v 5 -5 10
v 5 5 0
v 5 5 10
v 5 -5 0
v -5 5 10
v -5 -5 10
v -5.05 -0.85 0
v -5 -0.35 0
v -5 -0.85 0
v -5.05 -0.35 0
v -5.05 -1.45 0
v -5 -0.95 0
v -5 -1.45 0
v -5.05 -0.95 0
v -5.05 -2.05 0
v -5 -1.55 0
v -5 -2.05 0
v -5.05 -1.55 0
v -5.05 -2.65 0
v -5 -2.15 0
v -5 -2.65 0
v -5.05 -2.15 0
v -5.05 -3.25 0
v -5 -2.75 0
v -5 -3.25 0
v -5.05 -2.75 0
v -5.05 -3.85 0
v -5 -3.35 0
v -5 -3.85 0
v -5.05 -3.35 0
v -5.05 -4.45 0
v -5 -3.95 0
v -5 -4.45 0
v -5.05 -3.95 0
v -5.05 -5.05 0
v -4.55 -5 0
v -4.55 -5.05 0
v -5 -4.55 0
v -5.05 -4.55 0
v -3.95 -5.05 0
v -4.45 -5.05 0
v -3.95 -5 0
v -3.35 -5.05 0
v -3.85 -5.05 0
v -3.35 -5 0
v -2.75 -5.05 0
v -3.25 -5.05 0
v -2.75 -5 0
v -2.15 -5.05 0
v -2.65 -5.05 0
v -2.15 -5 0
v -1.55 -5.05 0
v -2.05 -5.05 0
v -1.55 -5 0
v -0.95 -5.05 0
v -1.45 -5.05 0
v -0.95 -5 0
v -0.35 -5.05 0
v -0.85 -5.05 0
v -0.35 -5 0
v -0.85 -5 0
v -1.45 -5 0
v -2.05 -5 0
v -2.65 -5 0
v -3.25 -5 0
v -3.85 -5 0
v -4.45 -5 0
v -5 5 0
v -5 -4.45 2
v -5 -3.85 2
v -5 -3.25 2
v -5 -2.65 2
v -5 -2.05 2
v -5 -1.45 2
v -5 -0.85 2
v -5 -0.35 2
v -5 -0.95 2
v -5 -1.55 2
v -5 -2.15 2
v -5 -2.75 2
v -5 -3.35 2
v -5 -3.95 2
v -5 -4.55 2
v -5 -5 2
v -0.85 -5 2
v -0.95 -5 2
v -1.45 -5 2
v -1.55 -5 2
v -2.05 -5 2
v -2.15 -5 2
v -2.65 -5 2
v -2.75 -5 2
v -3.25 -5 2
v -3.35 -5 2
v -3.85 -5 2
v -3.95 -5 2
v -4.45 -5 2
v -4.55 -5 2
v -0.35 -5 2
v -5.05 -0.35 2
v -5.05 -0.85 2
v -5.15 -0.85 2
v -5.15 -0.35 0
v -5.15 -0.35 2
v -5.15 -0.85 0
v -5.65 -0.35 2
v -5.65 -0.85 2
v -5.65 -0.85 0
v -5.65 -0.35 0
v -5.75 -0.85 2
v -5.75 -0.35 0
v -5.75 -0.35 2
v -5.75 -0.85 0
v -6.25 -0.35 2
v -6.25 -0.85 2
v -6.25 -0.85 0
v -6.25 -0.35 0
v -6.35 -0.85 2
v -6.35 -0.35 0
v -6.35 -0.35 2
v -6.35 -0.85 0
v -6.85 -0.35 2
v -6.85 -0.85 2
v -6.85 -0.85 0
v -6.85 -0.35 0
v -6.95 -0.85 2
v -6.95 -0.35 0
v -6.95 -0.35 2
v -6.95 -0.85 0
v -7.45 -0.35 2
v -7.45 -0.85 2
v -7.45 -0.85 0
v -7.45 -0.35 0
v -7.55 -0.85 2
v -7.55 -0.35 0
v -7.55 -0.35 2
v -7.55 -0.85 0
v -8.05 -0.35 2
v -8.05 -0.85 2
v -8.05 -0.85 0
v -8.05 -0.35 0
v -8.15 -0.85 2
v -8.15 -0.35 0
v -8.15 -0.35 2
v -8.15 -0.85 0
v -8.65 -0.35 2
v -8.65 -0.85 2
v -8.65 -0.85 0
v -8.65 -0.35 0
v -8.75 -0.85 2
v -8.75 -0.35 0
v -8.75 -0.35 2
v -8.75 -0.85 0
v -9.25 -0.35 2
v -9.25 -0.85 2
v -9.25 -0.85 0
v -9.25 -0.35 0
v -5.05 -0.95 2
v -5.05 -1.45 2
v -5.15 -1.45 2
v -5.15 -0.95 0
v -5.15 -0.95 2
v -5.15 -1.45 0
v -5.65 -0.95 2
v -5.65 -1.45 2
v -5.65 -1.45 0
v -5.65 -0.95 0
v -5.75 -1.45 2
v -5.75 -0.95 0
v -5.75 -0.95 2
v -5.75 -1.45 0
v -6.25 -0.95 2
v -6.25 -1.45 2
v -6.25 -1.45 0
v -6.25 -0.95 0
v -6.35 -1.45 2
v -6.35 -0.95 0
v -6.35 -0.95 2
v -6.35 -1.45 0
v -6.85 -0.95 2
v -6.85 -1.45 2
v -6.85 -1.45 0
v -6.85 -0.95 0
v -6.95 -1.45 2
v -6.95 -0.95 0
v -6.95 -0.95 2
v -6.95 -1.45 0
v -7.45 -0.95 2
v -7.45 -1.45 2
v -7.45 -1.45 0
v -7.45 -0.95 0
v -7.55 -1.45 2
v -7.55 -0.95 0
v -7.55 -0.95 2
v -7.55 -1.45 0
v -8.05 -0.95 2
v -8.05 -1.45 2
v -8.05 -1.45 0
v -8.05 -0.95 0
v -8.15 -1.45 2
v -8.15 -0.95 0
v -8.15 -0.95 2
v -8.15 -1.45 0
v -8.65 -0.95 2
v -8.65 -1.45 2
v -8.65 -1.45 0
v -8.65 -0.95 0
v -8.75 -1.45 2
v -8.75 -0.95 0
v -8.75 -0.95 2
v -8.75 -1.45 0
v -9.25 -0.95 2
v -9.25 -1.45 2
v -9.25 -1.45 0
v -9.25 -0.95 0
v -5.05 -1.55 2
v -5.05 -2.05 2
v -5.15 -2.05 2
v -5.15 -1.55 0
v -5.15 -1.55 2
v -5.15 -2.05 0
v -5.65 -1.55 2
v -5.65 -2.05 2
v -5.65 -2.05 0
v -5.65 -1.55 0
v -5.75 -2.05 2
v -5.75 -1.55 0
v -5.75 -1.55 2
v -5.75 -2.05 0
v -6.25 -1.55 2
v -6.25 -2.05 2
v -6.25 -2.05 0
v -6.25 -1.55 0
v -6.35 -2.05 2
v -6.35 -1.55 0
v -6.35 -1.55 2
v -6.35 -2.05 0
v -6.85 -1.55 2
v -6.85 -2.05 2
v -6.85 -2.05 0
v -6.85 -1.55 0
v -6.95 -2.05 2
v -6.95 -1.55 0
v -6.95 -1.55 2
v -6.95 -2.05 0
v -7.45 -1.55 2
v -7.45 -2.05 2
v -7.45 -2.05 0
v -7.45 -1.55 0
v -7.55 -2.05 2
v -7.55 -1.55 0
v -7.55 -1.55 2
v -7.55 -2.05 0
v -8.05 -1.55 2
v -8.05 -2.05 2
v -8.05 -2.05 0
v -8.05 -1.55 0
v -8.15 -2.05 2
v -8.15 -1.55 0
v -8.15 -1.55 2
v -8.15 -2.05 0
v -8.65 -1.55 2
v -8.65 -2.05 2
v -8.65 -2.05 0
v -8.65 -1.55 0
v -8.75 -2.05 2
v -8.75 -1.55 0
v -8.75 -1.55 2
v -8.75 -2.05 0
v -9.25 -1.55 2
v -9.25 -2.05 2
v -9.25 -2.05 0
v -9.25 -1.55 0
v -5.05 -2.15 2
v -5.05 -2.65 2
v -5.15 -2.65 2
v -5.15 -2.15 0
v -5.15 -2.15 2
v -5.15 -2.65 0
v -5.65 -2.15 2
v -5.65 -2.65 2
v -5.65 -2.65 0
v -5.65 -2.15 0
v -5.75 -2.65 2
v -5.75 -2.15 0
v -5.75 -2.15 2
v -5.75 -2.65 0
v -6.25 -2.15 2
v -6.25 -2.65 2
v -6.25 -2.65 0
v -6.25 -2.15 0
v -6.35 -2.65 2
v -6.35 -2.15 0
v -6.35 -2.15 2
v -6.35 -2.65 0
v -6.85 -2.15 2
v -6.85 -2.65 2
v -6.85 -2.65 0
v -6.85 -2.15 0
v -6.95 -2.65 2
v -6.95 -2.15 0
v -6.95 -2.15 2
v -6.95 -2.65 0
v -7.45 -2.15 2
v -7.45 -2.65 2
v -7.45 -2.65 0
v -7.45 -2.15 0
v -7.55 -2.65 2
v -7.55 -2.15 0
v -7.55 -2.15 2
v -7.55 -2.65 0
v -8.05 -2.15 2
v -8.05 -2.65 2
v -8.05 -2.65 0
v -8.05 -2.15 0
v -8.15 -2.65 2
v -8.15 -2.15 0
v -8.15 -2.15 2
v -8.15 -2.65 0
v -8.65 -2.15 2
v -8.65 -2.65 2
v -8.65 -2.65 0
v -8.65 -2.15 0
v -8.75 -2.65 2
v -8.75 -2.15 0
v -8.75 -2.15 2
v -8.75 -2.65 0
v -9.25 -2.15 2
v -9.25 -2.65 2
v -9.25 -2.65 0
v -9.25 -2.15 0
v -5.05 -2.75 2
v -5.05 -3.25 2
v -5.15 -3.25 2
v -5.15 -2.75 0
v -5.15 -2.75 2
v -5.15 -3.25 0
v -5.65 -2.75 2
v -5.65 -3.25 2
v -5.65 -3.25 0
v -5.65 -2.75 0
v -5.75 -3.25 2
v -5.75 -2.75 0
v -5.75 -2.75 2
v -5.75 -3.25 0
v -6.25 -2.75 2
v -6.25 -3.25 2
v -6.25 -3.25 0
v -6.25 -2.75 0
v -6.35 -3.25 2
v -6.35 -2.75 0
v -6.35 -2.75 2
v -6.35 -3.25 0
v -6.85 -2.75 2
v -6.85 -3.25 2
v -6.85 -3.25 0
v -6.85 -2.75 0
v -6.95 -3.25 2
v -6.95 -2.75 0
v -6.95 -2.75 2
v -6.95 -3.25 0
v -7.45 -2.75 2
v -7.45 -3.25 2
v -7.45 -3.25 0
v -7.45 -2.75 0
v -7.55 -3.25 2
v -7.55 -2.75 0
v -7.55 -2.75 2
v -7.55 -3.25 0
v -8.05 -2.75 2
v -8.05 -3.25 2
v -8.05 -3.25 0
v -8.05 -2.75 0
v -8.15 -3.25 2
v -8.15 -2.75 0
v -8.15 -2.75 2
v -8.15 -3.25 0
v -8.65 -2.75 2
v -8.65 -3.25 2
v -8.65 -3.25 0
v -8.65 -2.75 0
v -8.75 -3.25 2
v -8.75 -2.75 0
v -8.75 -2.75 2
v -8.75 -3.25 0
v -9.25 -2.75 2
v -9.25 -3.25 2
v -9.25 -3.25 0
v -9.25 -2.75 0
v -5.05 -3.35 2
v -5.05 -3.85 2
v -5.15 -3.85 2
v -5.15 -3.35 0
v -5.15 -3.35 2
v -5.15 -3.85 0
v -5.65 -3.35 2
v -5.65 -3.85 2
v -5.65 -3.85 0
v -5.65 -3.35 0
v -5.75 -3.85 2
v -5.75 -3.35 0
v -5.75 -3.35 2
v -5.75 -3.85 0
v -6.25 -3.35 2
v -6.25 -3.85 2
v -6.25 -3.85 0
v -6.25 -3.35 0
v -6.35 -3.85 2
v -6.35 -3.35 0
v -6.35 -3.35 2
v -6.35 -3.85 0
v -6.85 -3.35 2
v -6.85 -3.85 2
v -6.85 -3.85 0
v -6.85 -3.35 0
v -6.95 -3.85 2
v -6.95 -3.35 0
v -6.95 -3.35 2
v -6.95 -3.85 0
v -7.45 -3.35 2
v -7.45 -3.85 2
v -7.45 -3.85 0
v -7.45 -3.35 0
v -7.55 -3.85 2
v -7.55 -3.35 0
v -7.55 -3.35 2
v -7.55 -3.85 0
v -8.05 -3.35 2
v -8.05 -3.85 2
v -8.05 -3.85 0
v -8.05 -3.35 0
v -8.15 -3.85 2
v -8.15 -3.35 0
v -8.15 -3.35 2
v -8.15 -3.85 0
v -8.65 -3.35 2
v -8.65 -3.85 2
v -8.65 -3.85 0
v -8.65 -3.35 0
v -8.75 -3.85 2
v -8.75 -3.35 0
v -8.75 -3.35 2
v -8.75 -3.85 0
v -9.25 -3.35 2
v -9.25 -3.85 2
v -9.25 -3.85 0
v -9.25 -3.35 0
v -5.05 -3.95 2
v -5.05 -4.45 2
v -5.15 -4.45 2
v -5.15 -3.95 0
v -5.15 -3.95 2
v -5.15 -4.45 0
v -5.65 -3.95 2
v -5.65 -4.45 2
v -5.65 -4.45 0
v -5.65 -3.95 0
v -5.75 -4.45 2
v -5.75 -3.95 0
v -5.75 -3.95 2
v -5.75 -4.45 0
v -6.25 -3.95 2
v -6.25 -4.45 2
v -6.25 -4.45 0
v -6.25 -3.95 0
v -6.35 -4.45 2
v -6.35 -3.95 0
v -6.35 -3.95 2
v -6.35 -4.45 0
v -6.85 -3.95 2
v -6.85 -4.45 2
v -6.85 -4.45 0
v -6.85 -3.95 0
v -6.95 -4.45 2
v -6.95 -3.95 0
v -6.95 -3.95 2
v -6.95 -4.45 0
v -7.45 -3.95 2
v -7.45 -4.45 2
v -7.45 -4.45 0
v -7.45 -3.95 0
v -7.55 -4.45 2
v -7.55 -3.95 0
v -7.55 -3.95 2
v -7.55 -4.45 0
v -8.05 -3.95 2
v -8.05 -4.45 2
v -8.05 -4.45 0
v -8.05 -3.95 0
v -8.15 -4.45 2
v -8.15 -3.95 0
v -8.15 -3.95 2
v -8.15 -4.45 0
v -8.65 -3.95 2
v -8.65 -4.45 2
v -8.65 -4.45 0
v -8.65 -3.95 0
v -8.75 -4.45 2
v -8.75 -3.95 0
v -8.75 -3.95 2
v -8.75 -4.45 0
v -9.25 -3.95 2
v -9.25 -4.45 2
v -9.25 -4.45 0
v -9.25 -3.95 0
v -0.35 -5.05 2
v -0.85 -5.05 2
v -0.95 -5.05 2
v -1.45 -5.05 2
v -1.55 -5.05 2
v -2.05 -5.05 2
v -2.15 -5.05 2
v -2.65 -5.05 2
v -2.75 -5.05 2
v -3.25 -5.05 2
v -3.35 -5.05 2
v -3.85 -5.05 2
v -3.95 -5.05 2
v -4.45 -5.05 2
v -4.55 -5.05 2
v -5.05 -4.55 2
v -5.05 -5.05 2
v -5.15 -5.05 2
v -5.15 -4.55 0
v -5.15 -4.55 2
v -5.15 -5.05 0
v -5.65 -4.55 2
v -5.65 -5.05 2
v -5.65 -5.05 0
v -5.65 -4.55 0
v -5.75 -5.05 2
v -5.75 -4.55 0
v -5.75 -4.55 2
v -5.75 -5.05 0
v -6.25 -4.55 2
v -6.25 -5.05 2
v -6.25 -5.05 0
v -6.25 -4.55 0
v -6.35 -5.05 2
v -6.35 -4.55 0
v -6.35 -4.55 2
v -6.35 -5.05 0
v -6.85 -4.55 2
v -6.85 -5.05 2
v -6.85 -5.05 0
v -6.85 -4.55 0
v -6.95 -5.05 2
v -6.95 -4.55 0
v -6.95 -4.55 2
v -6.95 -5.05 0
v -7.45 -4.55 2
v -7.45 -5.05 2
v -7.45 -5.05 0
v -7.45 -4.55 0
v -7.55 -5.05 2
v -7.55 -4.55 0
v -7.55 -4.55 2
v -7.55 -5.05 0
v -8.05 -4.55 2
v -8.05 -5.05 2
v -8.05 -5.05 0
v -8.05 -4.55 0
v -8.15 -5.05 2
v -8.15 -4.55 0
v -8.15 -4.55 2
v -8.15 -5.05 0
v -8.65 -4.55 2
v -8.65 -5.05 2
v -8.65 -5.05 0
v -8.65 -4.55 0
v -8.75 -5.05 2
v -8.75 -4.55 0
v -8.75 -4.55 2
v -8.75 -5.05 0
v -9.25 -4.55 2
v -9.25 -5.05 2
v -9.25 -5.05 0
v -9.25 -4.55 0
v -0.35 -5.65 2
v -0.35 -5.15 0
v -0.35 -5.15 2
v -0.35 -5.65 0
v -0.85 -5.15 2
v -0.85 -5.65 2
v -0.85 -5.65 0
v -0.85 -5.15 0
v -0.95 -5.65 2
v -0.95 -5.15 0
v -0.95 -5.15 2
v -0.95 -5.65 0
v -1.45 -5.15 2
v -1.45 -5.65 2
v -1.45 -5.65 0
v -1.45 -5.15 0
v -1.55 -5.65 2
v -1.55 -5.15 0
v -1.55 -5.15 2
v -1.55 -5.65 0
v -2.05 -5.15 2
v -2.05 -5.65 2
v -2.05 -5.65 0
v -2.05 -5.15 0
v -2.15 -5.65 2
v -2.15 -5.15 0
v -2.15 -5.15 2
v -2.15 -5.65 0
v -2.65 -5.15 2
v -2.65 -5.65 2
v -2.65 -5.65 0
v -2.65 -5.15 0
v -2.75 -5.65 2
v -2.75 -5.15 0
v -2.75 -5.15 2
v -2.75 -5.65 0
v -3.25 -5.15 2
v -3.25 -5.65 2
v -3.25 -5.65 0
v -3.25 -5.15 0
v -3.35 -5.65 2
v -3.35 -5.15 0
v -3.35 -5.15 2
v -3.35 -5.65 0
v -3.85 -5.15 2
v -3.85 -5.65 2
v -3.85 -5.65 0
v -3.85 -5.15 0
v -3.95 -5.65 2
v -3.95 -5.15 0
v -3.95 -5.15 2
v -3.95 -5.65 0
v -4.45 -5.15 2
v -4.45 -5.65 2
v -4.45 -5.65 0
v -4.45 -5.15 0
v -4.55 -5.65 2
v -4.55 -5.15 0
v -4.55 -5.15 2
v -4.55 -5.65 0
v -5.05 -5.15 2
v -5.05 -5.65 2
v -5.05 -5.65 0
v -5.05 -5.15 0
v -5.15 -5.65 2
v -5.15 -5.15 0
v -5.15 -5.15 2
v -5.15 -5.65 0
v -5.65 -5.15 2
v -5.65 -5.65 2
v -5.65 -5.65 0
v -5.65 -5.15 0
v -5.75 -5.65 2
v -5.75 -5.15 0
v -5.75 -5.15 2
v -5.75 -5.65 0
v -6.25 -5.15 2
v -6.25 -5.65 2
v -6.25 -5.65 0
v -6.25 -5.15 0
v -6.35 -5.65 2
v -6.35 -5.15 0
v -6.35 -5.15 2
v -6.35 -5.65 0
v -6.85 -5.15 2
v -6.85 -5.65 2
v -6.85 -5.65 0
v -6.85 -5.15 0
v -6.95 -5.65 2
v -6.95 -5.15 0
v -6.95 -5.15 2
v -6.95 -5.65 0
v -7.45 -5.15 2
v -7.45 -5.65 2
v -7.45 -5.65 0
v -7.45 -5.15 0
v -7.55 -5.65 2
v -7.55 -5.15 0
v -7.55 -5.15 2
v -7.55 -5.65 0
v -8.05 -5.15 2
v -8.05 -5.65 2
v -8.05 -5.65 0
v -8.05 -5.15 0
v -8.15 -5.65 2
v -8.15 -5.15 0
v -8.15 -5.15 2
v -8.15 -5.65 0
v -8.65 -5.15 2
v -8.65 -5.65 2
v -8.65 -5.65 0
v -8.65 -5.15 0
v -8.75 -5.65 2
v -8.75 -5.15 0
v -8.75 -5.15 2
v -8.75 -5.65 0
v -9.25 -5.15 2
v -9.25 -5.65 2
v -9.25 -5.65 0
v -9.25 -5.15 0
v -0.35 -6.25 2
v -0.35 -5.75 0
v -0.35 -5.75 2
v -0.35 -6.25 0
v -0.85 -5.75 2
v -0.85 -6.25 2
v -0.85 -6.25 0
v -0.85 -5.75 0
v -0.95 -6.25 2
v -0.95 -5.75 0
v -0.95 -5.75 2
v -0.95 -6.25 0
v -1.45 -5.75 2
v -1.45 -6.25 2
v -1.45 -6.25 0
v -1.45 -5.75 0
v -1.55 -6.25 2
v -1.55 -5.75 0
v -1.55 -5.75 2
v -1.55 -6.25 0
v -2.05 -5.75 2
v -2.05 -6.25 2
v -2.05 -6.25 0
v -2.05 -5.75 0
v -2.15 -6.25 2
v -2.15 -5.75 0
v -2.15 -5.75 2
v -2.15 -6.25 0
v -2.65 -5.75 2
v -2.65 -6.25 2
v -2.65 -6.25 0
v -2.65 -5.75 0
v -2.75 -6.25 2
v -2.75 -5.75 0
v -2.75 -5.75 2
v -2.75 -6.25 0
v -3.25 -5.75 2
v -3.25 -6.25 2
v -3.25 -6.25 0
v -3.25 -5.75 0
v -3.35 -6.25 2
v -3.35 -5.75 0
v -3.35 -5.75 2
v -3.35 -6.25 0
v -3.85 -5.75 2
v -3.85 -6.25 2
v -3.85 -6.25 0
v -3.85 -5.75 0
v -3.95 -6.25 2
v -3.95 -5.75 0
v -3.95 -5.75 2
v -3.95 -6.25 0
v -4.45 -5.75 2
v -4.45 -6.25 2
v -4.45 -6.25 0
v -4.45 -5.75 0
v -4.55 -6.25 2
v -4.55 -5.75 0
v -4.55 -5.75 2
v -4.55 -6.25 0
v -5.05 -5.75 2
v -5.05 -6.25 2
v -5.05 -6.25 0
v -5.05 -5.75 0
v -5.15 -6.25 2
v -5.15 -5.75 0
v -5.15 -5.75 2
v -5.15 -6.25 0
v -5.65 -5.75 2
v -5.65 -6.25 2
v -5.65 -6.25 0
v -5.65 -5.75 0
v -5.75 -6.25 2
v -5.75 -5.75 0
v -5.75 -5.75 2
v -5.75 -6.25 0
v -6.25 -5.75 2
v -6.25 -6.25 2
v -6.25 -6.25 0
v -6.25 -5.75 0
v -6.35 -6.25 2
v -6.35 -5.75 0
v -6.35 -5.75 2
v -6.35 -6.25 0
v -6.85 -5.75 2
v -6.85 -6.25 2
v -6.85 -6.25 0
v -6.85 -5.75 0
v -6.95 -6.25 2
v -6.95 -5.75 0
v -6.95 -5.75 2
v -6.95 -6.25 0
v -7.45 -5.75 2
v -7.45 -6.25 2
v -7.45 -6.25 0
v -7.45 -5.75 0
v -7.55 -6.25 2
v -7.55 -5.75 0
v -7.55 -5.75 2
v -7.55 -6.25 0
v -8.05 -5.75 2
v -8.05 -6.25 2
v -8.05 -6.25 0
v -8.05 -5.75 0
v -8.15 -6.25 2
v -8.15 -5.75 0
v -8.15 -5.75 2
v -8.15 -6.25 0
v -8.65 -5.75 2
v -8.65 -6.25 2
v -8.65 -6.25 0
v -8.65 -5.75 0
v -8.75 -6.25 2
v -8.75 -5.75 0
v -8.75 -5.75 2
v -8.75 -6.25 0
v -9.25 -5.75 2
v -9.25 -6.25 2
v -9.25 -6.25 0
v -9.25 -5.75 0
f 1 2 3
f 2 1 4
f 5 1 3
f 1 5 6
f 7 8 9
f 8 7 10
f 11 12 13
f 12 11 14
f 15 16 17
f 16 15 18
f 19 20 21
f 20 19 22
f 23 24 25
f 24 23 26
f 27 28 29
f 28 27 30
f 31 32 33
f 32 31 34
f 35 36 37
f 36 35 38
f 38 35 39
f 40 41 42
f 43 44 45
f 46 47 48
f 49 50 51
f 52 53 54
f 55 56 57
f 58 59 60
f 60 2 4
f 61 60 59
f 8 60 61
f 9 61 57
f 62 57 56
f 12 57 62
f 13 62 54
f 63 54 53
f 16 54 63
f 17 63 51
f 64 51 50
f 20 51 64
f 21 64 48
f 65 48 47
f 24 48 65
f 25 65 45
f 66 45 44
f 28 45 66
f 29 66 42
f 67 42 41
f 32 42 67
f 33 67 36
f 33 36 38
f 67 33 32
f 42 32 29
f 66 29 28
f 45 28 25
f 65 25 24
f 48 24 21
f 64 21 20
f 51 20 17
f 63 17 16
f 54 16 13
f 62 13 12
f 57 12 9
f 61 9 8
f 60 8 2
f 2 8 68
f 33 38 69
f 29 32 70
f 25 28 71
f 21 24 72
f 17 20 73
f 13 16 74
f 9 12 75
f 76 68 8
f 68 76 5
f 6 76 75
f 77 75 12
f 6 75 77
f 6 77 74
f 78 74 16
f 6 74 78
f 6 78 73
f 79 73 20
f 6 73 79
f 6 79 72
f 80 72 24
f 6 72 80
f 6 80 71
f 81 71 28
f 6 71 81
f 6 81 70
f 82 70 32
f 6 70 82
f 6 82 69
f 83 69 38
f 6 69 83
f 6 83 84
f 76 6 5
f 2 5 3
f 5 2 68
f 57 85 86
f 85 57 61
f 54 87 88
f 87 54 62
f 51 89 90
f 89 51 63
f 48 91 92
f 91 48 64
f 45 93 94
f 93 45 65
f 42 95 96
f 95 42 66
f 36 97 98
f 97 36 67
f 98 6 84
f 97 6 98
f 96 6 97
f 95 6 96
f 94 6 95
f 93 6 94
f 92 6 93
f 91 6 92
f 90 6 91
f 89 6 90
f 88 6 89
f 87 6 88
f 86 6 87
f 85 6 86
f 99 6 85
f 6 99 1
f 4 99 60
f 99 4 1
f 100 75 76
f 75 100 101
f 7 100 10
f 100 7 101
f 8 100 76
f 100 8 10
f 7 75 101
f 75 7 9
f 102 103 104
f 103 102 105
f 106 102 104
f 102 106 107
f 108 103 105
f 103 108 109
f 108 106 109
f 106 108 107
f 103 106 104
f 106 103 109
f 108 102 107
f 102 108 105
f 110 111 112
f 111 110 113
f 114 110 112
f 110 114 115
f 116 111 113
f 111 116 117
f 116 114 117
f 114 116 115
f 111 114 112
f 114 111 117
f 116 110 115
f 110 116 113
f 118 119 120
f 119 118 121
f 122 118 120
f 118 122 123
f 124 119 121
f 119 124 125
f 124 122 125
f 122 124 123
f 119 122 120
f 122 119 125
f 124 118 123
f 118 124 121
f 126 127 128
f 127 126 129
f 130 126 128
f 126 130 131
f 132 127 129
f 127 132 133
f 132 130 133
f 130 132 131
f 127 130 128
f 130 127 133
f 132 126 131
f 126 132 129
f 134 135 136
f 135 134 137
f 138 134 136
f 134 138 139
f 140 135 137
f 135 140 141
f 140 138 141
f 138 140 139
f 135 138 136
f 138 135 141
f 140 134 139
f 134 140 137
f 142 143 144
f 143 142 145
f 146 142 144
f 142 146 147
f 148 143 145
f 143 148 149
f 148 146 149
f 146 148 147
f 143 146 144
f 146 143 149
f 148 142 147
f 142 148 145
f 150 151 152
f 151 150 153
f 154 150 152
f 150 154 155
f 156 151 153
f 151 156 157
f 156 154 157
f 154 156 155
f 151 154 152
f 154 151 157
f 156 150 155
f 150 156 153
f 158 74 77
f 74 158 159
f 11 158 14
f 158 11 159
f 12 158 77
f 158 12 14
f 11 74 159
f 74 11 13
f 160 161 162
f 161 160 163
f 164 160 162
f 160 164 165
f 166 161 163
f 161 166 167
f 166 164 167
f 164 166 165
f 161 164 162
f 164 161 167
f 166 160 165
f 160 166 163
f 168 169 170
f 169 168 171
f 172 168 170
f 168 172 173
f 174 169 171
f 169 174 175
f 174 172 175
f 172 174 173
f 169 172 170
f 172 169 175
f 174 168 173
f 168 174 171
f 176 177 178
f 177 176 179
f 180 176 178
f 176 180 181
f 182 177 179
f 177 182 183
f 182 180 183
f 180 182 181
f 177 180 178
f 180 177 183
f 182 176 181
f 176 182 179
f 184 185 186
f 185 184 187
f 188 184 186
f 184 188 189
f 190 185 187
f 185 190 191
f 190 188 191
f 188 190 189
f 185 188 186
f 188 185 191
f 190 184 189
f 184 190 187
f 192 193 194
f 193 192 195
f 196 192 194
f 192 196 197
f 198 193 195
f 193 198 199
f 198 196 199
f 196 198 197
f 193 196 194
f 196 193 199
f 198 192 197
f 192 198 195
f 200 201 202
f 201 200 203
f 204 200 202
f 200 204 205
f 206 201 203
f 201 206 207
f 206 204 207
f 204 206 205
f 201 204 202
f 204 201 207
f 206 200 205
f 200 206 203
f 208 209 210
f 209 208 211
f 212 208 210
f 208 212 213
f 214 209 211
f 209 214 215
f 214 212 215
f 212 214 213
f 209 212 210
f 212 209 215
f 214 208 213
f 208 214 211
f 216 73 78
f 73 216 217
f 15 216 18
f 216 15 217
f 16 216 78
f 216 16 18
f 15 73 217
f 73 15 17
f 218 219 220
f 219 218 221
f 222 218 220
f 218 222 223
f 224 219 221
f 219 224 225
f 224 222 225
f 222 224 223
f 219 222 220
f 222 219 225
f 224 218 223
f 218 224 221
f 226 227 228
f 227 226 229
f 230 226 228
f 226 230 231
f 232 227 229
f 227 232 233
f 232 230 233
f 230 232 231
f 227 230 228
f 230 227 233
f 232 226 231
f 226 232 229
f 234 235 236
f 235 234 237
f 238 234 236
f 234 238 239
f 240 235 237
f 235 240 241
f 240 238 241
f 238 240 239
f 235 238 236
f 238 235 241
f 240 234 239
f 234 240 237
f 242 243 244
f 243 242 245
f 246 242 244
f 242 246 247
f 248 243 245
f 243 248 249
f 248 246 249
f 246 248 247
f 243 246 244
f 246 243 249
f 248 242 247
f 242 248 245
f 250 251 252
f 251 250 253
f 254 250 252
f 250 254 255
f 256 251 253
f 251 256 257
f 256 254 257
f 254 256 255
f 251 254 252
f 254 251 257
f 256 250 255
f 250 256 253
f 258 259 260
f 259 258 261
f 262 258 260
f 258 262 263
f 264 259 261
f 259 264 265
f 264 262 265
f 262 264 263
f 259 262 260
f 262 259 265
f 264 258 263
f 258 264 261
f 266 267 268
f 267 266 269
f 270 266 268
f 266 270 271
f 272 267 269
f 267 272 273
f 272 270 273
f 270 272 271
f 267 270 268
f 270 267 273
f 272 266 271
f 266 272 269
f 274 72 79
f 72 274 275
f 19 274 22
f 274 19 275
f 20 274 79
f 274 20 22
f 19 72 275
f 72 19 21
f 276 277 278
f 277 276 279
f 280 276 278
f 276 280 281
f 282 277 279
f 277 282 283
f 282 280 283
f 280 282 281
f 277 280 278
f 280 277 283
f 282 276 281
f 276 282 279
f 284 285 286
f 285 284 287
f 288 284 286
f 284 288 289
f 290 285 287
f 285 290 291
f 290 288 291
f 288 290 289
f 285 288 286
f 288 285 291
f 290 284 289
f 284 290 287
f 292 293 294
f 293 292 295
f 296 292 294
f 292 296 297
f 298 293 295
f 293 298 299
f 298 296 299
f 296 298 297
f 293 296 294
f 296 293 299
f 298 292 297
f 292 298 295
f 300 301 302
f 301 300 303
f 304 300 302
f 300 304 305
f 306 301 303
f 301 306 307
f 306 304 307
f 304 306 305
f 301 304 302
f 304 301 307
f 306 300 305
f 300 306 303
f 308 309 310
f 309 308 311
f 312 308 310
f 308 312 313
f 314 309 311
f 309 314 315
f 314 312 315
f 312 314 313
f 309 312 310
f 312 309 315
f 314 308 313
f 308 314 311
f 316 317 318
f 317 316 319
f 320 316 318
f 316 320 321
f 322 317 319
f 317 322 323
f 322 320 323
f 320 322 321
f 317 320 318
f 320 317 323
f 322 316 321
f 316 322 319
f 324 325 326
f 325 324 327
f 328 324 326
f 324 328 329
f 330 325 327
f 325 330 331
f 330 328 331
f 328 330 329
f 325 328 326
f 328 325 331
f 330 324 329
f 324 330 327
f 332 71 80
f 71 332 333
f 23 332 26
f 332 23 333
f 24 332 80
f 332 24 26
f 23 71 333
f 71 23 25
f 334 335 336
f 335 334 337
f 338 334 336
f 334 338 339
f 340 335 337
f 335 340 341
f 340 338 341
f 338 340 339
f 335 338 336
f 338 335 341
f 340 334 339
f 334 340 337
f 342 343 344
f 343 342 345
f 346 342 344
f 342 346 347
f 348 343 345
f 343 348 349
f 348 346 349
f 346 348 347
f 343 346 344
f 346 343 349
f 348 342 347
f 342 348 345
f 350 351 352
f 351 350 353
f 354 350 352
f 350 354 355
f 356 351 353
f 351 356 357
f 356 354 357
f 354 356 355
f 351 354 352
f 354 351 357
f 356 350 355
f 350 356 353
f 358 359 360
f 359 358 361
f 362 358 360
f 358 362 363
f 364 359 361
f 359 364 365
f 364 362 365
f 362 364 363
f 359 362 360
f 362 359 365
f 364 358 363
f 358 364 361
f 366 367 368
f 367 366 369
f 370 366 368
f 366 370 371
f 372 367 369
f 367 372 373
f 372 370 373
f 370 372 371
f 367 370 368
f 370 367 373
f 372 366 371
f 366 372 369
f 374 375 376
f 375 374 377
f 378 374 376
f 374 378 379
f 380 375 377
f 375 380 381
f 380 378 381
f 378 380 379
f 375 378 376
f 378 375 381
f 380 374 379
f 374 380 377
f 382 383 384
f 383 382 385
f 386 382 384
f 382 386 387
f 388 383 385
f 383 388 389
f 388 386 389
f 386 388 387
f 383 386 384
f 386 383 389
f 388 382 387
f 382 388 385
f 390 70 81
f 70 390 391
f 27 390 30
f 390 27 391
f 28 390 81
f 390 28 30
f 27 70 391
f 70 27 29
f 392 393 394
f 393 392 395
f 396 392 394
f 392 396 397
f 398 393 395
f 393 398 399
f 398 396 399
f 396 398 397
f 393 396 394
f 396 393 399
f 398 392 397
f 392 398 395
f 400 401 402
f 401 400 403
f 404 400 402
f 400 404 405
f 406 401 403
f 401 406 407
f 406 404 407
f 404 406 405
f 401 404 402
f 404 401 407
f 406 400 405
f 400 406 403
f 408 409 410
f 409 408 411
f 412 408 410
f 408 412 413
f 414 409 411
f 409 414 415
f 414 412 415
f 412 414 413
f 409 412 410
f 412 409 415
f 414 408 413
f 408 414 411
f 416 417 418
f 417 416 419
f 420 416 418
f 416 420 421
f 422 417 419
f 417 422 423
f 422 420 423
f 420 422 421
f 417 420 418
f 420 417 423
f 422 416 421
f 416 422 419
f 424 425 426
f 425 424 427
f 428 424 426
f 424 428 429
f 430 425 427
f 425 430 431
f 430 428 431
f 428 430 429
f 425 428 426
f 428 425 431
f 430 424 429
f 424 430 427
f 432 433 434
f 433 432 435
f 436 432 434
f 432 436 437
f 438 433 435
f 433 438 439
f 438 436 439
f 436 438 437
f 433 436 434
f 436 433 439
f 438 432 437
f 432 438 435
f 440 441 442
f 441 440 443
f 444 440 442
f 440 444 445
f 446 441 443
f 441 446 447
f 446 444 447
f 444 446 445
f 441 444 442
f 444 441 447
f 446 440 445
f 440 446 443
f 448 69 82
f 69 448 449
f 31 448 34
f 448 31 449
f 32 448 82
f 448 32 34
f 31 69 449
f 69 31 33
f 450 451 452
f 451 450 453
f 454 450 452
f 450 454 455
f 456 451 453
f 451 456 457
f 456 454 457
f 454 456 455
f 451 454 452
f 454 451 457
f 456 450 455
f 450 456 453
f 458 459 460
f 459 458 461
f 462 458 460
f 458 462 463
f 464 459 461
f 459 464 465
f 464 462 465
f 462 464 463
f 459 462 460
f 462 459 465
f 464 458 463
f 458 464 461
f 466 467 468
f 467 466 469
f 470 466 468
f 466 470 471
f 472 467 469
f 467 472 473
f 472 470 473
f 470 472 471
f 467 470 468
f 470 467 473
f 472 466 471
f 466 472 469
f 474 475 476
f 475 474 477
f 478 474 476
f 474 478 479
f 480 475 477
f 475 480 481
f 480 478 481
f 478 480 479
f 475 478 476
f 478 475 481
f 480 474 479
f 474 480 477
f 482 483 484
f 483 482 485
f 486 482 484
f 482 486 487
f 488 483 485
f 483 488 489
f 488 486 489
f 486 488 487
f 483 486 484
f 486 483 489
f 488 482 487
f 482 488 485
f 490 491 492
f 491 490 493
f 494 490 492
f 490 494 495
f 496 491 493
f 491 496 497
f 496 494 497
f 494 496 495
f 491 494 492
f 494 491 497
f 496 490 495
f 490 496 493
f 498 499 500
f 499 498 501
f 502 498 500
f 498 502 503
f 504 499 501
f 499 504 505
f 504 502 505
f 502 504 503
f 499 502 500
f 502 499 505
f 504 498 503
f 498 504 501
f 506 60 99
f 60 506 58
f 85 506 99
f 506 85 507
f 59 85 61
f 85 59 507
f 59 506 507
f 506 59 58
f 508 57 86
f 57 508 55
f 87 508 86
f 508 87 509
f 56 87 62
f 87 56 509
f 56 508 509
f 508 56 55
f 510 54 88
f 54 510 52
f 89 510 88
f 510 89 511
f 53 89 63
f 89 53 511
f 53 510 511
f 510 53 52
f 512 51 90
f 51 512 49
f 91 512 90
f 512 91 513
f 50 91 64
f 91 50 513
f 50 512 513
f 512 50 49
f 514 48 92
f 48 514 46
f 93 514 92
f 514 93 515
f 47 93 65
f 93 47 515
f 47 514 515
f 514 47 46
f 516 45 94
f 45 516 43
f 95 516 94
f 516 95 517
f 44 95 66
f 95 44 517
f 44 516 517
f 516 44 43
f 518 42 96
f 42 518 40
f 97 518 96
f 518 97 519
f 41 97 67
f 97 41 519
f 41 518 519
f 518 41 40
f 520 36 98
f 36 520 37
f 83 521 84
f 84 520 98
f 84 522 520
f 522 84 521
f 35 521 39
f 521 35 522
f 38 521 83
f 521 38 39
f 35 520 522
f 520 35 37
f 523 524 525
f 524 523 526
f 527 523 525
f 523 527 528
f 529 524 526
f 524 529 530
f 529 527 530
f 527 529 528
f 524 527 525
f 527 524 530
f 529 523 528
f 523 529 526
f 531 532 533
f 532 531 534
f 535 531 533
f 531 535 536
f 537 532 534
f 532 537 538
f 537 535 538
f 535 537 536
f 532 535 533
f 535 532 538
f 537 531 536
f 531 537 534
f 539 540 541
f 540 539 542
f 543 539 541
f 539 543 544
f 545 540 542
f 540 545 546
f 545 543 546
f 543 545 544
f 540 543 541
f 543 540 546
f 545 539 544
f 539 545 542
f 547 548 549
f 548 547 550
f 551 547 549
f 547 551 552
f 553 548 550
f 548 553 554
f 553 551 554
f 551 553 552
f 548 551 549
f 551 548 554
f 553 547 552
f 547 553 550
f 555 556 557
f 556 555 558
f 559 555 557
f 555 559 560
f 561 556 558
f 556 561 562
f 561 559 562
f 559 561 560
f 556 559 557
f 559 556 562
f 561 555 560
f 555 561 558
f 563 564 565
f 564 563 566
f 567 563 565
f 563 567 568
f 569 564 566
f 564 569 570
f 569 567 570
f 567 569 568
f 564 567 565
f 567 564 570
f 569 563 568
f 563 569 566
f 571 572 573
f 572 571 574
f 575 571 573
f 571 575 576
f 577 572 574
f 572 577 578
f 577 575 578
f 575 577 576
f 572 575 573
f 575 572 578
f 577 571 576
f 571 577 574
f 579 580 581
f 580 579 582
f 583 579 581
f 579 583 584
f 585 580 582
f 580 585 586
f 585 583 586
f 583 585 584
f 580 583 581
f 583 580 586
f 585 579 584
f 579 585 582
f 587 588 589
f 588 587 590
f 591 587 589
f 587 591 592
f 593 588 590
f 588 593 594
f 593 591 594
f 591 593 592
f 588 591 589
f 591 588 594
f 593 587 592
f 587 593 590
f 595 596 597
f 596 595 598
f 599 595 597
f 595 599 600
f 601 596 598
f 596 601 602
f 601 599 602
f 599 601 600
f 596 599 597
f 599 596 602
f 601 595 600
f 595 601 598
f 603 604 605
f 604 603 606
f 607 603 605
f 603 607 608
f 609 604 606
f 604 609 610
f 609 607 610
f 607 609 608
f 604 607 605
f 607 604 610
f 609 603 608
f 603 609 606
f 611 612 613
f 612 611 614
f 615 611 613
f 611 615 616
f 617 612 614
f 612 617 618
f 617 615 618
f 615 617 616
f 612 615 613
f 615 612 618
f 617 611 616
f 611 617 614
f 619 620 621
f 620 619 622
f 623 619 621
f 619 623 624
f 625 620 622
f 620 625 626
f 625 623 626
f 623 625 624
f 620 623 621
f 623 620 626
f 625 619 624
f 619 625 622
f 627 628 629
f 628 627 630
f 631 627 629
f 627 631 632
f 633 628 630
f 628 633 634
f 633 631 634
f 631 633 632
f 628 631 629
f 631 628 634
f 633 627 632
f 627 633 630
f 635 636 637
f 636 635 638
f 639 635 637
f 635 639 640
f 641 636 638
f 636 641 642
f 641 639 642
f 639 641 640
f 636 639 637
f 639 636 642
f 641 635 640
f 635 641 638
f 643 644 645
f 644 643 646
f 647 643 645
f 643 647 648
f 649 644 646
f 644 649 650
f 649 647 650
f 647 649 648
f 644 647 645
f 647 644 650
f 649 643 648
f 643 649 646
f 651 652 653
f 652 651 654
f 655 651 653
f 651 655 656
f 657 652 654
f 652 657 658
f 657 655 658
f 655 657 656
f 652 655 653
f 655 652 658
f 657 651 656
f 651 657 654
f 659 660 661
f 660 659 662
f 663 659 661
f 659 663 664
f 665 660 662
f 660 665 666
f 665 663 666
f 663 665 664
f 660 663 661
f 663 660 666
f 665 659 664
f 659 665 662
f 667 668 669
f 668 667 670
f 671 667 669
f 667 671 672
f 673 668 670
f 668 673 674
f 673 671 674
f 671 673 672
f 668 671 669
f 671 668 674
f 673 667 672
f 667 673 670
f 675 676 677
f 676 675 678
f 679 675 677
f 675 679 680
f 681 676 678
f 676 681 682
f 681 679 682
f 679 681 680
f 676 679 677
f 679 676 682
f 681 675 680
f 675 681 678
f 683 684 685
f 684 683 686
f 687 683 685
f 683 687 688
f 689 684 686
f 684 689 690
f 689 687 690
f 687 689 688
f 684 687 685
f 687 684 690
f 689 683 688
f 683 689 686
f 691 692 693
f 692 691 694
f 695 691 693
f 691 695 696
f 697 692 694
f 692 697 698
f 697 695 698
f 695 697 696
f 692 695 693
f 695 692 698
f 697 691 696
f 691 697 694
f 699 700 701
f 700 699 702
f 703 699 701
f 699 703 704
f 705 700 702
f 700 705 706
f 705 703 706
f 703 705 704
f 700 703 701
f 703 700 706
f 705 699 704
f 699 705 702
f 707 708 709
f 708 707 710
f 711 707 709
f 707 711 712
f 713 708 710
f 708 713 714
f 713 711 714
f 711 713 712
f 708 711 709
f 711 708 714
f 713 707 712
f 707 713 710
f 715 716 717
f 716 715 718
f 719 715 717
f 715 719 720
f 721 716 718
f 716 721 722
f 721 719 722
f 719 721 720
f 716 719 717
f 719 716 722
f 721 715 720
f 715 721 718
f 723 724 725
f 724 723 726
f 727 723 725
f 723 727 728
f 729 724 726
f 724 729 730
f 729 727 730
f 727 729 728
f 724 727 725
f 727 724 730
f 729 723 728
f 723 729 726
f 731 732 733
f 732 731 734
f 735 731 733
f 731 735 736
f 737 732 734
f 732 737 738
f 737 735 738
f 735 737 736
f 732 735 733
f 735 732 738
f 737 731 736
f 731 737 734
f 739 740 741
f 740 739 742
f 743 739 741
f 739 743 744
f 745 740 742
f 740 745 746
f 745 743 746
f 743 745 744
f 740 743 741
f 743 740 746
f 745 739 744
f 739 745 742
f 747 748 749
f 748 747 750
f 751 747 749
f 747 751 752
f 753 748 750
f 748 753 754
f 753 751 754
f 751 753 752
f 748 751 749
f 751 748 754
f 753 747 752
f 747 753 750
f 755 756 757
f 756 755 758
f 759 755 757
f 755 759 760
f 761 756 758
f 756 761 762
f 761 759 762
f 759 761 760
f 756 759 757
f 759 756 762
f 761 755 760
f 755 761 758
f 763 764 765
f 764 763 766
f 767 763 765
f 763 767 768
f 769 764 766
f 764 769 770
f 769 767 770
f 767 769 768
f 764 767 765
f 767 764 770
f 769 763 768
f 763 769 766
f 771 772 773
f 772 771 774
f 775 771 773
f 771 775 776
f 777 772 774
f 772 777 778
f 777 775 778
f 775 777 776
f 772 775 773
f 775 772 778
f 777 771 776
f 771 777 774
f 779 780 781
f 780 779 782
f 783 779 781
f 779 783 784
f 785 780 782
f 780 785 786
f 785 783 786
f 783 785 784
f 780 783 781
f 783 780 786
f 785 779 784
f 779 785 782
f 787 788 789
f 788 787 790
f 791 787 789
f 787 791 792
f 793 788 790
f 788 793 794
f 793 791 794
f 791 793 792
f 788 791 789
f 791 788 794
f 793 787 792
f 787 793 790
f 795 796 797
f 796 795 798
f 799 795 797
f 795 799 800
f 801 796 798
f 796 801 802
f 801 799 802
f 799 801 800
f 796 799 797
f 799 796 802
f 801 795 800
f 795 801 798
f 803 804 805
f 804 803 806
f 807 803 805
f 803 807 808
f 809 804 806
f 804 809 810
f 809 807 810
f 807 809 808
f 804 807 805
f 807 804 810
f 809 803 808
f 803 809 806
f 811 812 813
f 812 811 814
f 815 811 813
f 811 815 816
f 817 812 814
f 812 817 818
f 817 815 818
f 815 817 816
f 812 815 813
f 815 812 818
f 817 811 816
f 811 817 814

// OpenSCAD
translate([0, 0, 5]) color([0,1,0,0.9]) cube([10, 10, 10], center=true);
translate([-0.6, -0.6, 1]) color([1,0,0]) cube([0.5, 0.5, 2], center=true);
translate([-1.2, -0.6, 1]) color([1,0,0]) cube([0.5, 0.5, 2], center=true);
translate([-1.8, -0.6, 1]) color([1,0,0]) cube([0.5, 0.5, 2], center=true);
translate([-2.4, -0.6, 1]) color([1,0,0]) cube([0.5, 0.5, 2], center=true);
translate([-3.0, -0.6, 1]) color([1,0,0]) cube([0.5, 0.5, 2], center=true);
translate([-3.6, -0.6, 1]) color([1,0,0]) cube([0.5, 0.5, 2], center=true);
translate([-4.2, -0.6, 1]) color([1,0,0]) cube([0.5, 0.5, 2], center=true);
translate([-4.8, -0.6, 1]) color([1,0,0]) cube([0.5, 0.5, 2], center=true);
translate([-5.4, -0.6, 1]) color([1,0,0]) cube([0.5, 0.5, 2], center=true);
translate([-6.0, -0.6, 1]) color([1,0,0]) cube([0.5, 0.5, 2], center=true);
translate([-6.6, -0.6, 1]) color([1,0,0]) cube([0.5, 0.5, 2], center=true);
translate([-7.2, -0.6, 1]) color([1,0,0]) cube([0.5, 0.5, 2], center=true);
translate([-7.8, -0.6, 1]) color([1,0,0]) cube([0.5, 0.5, 2], center=true);
translate([-8.4, -0.6, 1]) color([1,0,0]) cube([0.5, 0.5, 2], center=true);
translate([-9.0, -0.6, 1]) color([1,0,0]) cube([0.5, 0.5, 2], center=true);
translate([-0.6, -1.2, 1]) color([1,0,0]) cube([0.5, 0.5, 2], center=true);
translate([-1.2, -1.2, 1]) color([1,0,0]) cube([0.5, 0.5, 2], center=true);
translate([-1.8, -1.2, 1]) color([1,0,0]) cube([0.5, 0.5, 2], center=true);
translate([-2.4, -1.2, 1]) color([1,0,0]) cube([0.5, 0.5, 2], center=true);
translate([-3.0, -1.2, 1]) color([1,0,0]) cube([0.5, 0.5, 2], center=true);
translate([-3.6, -1.2, 1]) color([1,0,0]) cube([0.5, 0.5, 2], center=true);
translate([-4.2, -1.2, 1]) color([1,0,0]) cube([0.5, 0.5, 2], center=true);
translate([-4.8, -1.2, 1]) color([1,0,0]) cube([0.5, 0.5, 2], center=true);
translate([-5.4, -1.2, 1]) color([1,0,0]) cube([0.5, 0.5, 2], center=true);
translate([-6.0, -1.2, 1]) color([1,0,0]) cube([0.5, 0.5, 2], center=true);
translate([-6.6, -1.2, 1]) color([1,0,0]) cube([0.5, 0.5, 2], center=true);
translate([-7.2, -1.2, 1]) color([1,0,0]) cube([0.5, 0.5, 2], center=true);
translate([-7.8, -1.2, 1]) color([1,0,0]) cube([0.5, 0.5, 2], center=true);
translate([-8.4, -1.2, 1]) color([1,0,0]) cube([0.5, 0.5, 2], center=true);
translate([-9.0, -1.2, 1]) color([1,0,0]) cube([0.5, 0.5, 2], center=true);
translate([-0.6, -1.8, 1]) color([1,0,0]) cube([0.5, 0.5, 2], center=true);
translate([-1.2, -1.8, 1]) color([1,0,0]) cube([0.5, 0.5, 2], center=true);
translate([-1.8, -1.8, 1]) color([1,0,0]) cube([0.5, 0.5, 2], center=true);
translate([-2.4, -1.8, 1]) color([1,0,0]) cube([0.5, 0.5, 2], center=true);
translate([-3.0, -1.8, 1]) color([1,0,0]) cube([0.5, 0.5, 2], center=true);
translate([-3.6, -1.8, 1]) color([1,0,0]) cube([0.5, 0.5, 2], center=true);
translate([-4.2, -1.8, 1]) color([1,0,0]) cube([0.5, 0.5, 2], center=true);
translate([-4.8, -1.8, 1]) color([1,0,0]) cube([0.5, 0.5, 2], center=true);
translate([-5.4, -1.8, 1]) color([1,0,0]) cube([0.5, 0.5, 2], center=true);
translate([-6.0, -1.8, 1]) color([1,0,0]) cube([0.5, 0.5, 2], center=true);
translate([-6.6, -1.8, 1]) color([1,0,0]) cube([0.5, 0.5, 2], center=true);
translate([-7.2, -1.8, 1]) color([1,0,0]) cube([0.5, 0.5, 2], center=true);
translate([-7.8, -1.8, 1]) color([1,0,0]) cube([0.5, 0.5, 2], center=true);
translate([-8.4, -1.8, 1]) color([1,0,0]) cube([0.5, 0.5, 2], center=true);
translate([-9.0, -1.8, 1]) color([1,0,0]) cube([0.5, 0.5, 2], center=true);
translate([-0.6, -2.4, 1]) color([1,0,0]) cube([0.5, 0.5, 2], center=true);
translate([-1.2, -2.4, 1]) color([1,0,0]) cube([0.5, 0.5, 2], center=true);
translate([-1.8, -2.4, 1]) color([1,0,0]) cube([0.5, 0.5, 2], center=true);
translate([-2.4, -2.4, 1]) color([1,0,0]) cube([0.5, 0.5, 2], center=true);
translate([-3.0, -2.4, 1]) color([1,0,0]) cube([0.5, 0.5, 2], center=true);
translate([-3.6, -2.4, 1]) color([1,0,0]) cube([0.5, 0.5, 2], center=true);
translate([-4.2, -2.4, 1]) color([1,0,0]) cube([0.5, 0.5, 2], center=true);
translate([-4.8, -2.4, 1]) color([1,0,0]) cube([0.5, 0.5, 2], center=true);
translate([-5.4, -2.4, 1]) color([1,0,0]) cube([0.5, 0.5, 2], center=true);
translate([-6.0, -2.4, 1]) color([1,0,0]) cube([0.5, 0.5, 2], center=true);
translate([-6.6, -2.4, 1]) color([1,0,0]) cube([0.5, 0.5, 2], center=true);
translate([-7.2, -2.4, 1]) color([1,0,0]) cube([0.5, 0.5, 2], center=true);
translate([-7.8, -2.4, 1]) color([1,0,0]) cube([0.5, 0.5, 2], center=true);
translate([-8.4, -2.4, 1]) color([1,0,0]) cube([0.5, 0.5, 2], center=true);
translate([-9.0, -2.4, 1]) color([1,0,0]) cube([0.5, 0.5, 2], center=true);
translate([-0.6, -3.0, 1]) color([1,0,0]) cube([0.5, 0.5, 2], center=true);
translate([-1.2, -3.0, 1]) color([1,0,0]) cube([0.5, 0.5, 2], center=true);
translate([-1.8, -3.0, 1]) color([1,0,0]) cube([0.5, 0.5, 2], center=true);
translate([-2.4, -3.0, 1]) color([1,0,0]) cube([0.5, 0.5, 2], center=true);
translate([-3.0, -3.0, 1]) color([1,0,0]) cube([0.5, 0.5, 2], center=true);
translate([-3.6, -3.0, 1]) color([1,0,0]) cube([0.5, 0.5, 2], center=true);
translate([-4.2, -3.0, 1]) color([1,0,0]) cube([0.5, 0.5, 2], center=true);
translate([-4.8, -3.0, 1]) color([1,0,0]) cube([0.5, 0.5, 2], center=true);
translate([-5.4, -3.0, 1]) color([1,0,0]) cube([0.5, 0.5, 2], center=true);
translate([-6.0, -3.0, 1]) color([1,0,0]) cube([0.5, 0.5, 2], center=true);
translate([-6.6, -3.0, 1]) color([1,0,0]) cube([0.5, 0.5, 2], center=true);
translate([-7.2, -3.0, 1]) color([1,0,0]) cube([0.5, 0.5, 2], center=true);
translate([-7.8, -3.0, 1]) color([1,0,0]) cube([0.5, 0.5, 2], center=true);
translate([-8.4, -3.0, 1]) color([1,0,0]) cube([0.5, 0.5, 2], center=true);
translate([-9.0, -3.0, 1]) color([1,0,0]) cube([0.5, 0.5, 2], center=true);
translate([-0.6, -3.6, 1]) color([1,0,0]) cube([0.5, 0.5, 2], center=true);
translate([-1.2, -3.6, 1]) color([1,0,0]) cube([0.5, 0.5, 2], center=true);
translate([-1.8, -3.6, 1]) color([1,0,0]) cube([0.5, 0.5, 2], center=true);
translate([-2.4, -3.6, 1]) color([1,0,0]) cube([0.5, 0.5, 2], center=true);
translate([-3.0, -3.6, 1]) color([1,0,0]) cube([0.5, 0.5, 2], center=true);
translate([-3.6, -3.6, 1]) color([1,0,0]) cube([0.5, 0.5, 2], center=true);
translate([-4.2, -3.6, 1]) color([1,0,0]) cube([0.5, 0.5, 2], center=true);
translate([-4.8, -3.6, 1]) color([1,0,0]) cube([0.5, 0.5, 2], center=true);
translate([-5.4, -3.6, 1]) color([1,0,0]) cube([0.5, 0.5, 2], center=true);
translate([-6.0, -3.6, 1]) color([1,0,0]) cube([0.5, 0.5, 2], center=true);
translate([-6.6, -3.6, 1]) color([1,0,0]) cube([0.5, 0.5, 2], center=true);
translate([-7.2, -3.6, 1]) color([1,0,0]) cube([0.5, 0.5, 2], center=true);
translate([-7.8, -3.6, 1]) color([1,0,0]) cube([0.5, 0.5, 2], center=true);
translate([-8.4, -3.6, 1]) color([1,0,0]) cube([0.5, 0.5, 2], center=true);
translate([-9.0, -3.6, 1]) color([1,0,0]) cube([0.5, 0.5, 2], center=true);
translate([-0.6, -4.2, 1]) color([1,0,0]) cube([0.5, 0.5, 2], center=true);
translate([-1.2, -4.2, 1]) color([1,0,0]) cube([0.5, 0.5, 2], center=true);
translate([-1.8, -4.2, 1]) color([1,0,0]) cube([0.5, 0.5, 2], center=true);
translate([-2.4, -4.2, 1]) color([1,0,0]) cube([0.5, 0.5, 2], center=true);
translate([-3.0, -4.2, 1]) color([1,0,0]) cube([0.5, 0.5, 2], center=true);
translate([-3.6, -4.2, 1]) color([1,0,0]) cube([0.5, 0.5, 2], center=true);
translate([-4.2, -4.2, 1]) color([1,0,0]) cube([0.5, 0.5, 2], center=true);
translate([-4.8, -4.2, 1]) color([1,0,0]) cube([0.5, 0.5, 2], center=true);
translate([-5.4, -4.2, 1]) color([1,0,0]) cube([0.5, 0.5, 2], center=true);
translate([-6.0, -4.2, 1]) color([1,0,0]) cube([0.5, 0.5, 2], center=true);
translate([-6.6, -4.2, 1]) color([1,0,0]) cube([0.5, 0.5, 2], center=true);
translate([-7.2, -4.2, 1]) color([1,0,0]) cube([0.5, 0.5, 2], center=true);
translate([-7.8, -4.2, 1]) color([1,0,0]) cube([0.5, 0.5, 2], center=true);
translate([-8.4, -4.2, 1]) color([1,0,0]) cube([0.5, 0.5, 2], center=true);
translate([-9.0, -4.2, 1]) color([1,0,0]) cube([0.5, 0.5, 2], center=true);
translate([-0.6, -4.8, 1]) color([1,0,0]) cube([0.5, 0.5, 2], center=true);
translate([-1.2, -4.8, 1]) color([1,0,0]) cube([0.5, 0.5, 2], center=true);
translate([-1.8, -4.8, 1]) color([1,0,0]) cube([0.5, 0.5, 2], center=true);
translate([-2.4, -4.8, 1]) color([1,0,0]) cube([0.5, 0.5, 2], center=true);
translate([-3.0, -4.8, 1]) color([1,0,0]) cube([0.5, 0.5, 2], center=true);
translate([-3.6, -4.8, 1]) color([1,0,0]) cube([0.5, 0.5, 2], center=true);
translate([-4.2, -4.8, 1]) color([1,0,0]) cube([0.5, 0.5, 2], center=true);
translate([-4.8, -4.8, 1]) color([1,0,0]) cube([0.5, 0.5, 2], center=true);
translate([-5.4, -4.8, 1]) color([1,0,0]) cube([0.5, 0.5, 2], center=true);
translate([-6.0, -4.8, 1]) color([1,0,0]) cube([0.5, 0.5, 2], center=true);
translate([-6.6, -4.8, 1]) color([1,0,0]) cube([0.5, 0.5, 2], center=true);
translate([-7.2, -4.8, 1]) color([1,0,0]) cube([0.5, 0.5, 2], center=true);
translate([-7.8, -4.8, 1]) color([1,0,0]) cube([0.5, 0.5, 2], center=true);
translate([-8.4, -4.8, 1]) color([1,0,0]) cube([0.5, 0.5, 2], center=true);
translate([-9.0, -4.8, 1]) color([1,0,0]) cube([0.5, 0.5, 2], center=true);
translate([-0.6, -5.4, 1]) color([1,0,0]) cube([0.5, 0.5, 2], center=true);
translate([-1.2, -5.4, 1]) color([1,0,0]) cube([0.5, 0.5, 2], center=true);
translate([-1.8, -5.4, 1]) color([1,0,0]) cube([0.5, 0.5, 2], center=true);
translate([-2.4, -5.4, 1]) color([1,0,0]) cube([0.5, 0.5, 2], center=true);
translate([-3.0, -5.4, 1]) color([1,0,0]) cube([0.5, 0.5, 2], center=true);
translate([-3.6, -5.4, 1]) color([1,0,0]) cube([0.5, 0.5, 2], center=true);
translate([-4.2, -5.4, 1]) color([1,0,0]) cube([0.5, 0.5, 2], center=true);
translate([-4.8, -5.4, 1]) color([1,0,0]) cube([0.5, 0.5, 2], center=true);
translate([-5.4, -5.4, 1]) color([1,0,0]) cube([0.5, 0.5, 2], center=true);
translate([-6.0, -5.4, 1]) color([1,0,0]) cube([0.5, 0.5, 2], center=true);
translate([-6.6, -5.4, 1]) color([1,0,0]) cube([0.5, 0.5, 2], center=true);
translate([-7.2, -5.4, 1]) color([1,0,0]) cube([0.5, 0.5, 2], center=true);
translate([-7.8, -5.4, 1]) color([1,0,0]) cube([0.5, 0.5, 2], center=true);
translate([-8.4, -5.4, 1]) color([1,0,0]) cube([0.5, 0.5, 2], center=true);
translate([-9.0, -5.4, 1]) color([1,0,0]) cube([0.5, 0.5, 2], center=true);
translate([-0.6, -6.0, 1]) color([1,0,0]) cube([0.5, 0.5, 2], center=true);
translate([-1.2, -6.0, 1]) color([1,0,0]) cube([0.5, 0.5, 2], center=true);
translate([-1.8, -6.0, 1]) color([1,0,0]) cube([0.5, 0.5, 2], center=true);
translate([-2.4, -6.0, 1]) color([1,0,0]) cube([0.5, 0.5, 2], center=true);
translate([-3.0, -6.0, 1]) color([1,0,0]) cube([0.5, 0.5, 2], center=true);
translate([-3.6, -6.0, 1]) color([1,0,0]) cube([0.5, 0.5, 2], center=true);
translate([-4.2, -6.0, 1]) color([1,0,0]) cube([0.5, 0.5, 2], center=true);
translate([-4.8, -6.0, 1]) color([1,0,0]) cube([0.5, 0.5, 2], center=true);
translate([-5.4, -6.0, 1]) color([1,0,0]) cube([0.5, 0.5, 2], center=true);
translate([-6.0, -6.0, 1]) color([1,0,0]) cube([0.5, 0.5, 2], center=true);
translate([-6.6, -6.0, 1]) color([1,0,0]) cube([0.5, 0.5, 2], center=true);
translate([-7.2, -6.0, 1]) color([1,0,0]) cube([0.5, 0.5, 2], center=true);
translate([-7.8, -6.0, 1]) color([1,0,0]) cube([0.5, 0.5, 2], center=true);
translate([-8.4, -6.0, 1]) color([1,0,0]) cube([0.5, 0.5, 2], center=true);
translate([-9.0, -6.0, 1]) color([1,0,0]) cube([0.5, 0.5, 2], center=true);
